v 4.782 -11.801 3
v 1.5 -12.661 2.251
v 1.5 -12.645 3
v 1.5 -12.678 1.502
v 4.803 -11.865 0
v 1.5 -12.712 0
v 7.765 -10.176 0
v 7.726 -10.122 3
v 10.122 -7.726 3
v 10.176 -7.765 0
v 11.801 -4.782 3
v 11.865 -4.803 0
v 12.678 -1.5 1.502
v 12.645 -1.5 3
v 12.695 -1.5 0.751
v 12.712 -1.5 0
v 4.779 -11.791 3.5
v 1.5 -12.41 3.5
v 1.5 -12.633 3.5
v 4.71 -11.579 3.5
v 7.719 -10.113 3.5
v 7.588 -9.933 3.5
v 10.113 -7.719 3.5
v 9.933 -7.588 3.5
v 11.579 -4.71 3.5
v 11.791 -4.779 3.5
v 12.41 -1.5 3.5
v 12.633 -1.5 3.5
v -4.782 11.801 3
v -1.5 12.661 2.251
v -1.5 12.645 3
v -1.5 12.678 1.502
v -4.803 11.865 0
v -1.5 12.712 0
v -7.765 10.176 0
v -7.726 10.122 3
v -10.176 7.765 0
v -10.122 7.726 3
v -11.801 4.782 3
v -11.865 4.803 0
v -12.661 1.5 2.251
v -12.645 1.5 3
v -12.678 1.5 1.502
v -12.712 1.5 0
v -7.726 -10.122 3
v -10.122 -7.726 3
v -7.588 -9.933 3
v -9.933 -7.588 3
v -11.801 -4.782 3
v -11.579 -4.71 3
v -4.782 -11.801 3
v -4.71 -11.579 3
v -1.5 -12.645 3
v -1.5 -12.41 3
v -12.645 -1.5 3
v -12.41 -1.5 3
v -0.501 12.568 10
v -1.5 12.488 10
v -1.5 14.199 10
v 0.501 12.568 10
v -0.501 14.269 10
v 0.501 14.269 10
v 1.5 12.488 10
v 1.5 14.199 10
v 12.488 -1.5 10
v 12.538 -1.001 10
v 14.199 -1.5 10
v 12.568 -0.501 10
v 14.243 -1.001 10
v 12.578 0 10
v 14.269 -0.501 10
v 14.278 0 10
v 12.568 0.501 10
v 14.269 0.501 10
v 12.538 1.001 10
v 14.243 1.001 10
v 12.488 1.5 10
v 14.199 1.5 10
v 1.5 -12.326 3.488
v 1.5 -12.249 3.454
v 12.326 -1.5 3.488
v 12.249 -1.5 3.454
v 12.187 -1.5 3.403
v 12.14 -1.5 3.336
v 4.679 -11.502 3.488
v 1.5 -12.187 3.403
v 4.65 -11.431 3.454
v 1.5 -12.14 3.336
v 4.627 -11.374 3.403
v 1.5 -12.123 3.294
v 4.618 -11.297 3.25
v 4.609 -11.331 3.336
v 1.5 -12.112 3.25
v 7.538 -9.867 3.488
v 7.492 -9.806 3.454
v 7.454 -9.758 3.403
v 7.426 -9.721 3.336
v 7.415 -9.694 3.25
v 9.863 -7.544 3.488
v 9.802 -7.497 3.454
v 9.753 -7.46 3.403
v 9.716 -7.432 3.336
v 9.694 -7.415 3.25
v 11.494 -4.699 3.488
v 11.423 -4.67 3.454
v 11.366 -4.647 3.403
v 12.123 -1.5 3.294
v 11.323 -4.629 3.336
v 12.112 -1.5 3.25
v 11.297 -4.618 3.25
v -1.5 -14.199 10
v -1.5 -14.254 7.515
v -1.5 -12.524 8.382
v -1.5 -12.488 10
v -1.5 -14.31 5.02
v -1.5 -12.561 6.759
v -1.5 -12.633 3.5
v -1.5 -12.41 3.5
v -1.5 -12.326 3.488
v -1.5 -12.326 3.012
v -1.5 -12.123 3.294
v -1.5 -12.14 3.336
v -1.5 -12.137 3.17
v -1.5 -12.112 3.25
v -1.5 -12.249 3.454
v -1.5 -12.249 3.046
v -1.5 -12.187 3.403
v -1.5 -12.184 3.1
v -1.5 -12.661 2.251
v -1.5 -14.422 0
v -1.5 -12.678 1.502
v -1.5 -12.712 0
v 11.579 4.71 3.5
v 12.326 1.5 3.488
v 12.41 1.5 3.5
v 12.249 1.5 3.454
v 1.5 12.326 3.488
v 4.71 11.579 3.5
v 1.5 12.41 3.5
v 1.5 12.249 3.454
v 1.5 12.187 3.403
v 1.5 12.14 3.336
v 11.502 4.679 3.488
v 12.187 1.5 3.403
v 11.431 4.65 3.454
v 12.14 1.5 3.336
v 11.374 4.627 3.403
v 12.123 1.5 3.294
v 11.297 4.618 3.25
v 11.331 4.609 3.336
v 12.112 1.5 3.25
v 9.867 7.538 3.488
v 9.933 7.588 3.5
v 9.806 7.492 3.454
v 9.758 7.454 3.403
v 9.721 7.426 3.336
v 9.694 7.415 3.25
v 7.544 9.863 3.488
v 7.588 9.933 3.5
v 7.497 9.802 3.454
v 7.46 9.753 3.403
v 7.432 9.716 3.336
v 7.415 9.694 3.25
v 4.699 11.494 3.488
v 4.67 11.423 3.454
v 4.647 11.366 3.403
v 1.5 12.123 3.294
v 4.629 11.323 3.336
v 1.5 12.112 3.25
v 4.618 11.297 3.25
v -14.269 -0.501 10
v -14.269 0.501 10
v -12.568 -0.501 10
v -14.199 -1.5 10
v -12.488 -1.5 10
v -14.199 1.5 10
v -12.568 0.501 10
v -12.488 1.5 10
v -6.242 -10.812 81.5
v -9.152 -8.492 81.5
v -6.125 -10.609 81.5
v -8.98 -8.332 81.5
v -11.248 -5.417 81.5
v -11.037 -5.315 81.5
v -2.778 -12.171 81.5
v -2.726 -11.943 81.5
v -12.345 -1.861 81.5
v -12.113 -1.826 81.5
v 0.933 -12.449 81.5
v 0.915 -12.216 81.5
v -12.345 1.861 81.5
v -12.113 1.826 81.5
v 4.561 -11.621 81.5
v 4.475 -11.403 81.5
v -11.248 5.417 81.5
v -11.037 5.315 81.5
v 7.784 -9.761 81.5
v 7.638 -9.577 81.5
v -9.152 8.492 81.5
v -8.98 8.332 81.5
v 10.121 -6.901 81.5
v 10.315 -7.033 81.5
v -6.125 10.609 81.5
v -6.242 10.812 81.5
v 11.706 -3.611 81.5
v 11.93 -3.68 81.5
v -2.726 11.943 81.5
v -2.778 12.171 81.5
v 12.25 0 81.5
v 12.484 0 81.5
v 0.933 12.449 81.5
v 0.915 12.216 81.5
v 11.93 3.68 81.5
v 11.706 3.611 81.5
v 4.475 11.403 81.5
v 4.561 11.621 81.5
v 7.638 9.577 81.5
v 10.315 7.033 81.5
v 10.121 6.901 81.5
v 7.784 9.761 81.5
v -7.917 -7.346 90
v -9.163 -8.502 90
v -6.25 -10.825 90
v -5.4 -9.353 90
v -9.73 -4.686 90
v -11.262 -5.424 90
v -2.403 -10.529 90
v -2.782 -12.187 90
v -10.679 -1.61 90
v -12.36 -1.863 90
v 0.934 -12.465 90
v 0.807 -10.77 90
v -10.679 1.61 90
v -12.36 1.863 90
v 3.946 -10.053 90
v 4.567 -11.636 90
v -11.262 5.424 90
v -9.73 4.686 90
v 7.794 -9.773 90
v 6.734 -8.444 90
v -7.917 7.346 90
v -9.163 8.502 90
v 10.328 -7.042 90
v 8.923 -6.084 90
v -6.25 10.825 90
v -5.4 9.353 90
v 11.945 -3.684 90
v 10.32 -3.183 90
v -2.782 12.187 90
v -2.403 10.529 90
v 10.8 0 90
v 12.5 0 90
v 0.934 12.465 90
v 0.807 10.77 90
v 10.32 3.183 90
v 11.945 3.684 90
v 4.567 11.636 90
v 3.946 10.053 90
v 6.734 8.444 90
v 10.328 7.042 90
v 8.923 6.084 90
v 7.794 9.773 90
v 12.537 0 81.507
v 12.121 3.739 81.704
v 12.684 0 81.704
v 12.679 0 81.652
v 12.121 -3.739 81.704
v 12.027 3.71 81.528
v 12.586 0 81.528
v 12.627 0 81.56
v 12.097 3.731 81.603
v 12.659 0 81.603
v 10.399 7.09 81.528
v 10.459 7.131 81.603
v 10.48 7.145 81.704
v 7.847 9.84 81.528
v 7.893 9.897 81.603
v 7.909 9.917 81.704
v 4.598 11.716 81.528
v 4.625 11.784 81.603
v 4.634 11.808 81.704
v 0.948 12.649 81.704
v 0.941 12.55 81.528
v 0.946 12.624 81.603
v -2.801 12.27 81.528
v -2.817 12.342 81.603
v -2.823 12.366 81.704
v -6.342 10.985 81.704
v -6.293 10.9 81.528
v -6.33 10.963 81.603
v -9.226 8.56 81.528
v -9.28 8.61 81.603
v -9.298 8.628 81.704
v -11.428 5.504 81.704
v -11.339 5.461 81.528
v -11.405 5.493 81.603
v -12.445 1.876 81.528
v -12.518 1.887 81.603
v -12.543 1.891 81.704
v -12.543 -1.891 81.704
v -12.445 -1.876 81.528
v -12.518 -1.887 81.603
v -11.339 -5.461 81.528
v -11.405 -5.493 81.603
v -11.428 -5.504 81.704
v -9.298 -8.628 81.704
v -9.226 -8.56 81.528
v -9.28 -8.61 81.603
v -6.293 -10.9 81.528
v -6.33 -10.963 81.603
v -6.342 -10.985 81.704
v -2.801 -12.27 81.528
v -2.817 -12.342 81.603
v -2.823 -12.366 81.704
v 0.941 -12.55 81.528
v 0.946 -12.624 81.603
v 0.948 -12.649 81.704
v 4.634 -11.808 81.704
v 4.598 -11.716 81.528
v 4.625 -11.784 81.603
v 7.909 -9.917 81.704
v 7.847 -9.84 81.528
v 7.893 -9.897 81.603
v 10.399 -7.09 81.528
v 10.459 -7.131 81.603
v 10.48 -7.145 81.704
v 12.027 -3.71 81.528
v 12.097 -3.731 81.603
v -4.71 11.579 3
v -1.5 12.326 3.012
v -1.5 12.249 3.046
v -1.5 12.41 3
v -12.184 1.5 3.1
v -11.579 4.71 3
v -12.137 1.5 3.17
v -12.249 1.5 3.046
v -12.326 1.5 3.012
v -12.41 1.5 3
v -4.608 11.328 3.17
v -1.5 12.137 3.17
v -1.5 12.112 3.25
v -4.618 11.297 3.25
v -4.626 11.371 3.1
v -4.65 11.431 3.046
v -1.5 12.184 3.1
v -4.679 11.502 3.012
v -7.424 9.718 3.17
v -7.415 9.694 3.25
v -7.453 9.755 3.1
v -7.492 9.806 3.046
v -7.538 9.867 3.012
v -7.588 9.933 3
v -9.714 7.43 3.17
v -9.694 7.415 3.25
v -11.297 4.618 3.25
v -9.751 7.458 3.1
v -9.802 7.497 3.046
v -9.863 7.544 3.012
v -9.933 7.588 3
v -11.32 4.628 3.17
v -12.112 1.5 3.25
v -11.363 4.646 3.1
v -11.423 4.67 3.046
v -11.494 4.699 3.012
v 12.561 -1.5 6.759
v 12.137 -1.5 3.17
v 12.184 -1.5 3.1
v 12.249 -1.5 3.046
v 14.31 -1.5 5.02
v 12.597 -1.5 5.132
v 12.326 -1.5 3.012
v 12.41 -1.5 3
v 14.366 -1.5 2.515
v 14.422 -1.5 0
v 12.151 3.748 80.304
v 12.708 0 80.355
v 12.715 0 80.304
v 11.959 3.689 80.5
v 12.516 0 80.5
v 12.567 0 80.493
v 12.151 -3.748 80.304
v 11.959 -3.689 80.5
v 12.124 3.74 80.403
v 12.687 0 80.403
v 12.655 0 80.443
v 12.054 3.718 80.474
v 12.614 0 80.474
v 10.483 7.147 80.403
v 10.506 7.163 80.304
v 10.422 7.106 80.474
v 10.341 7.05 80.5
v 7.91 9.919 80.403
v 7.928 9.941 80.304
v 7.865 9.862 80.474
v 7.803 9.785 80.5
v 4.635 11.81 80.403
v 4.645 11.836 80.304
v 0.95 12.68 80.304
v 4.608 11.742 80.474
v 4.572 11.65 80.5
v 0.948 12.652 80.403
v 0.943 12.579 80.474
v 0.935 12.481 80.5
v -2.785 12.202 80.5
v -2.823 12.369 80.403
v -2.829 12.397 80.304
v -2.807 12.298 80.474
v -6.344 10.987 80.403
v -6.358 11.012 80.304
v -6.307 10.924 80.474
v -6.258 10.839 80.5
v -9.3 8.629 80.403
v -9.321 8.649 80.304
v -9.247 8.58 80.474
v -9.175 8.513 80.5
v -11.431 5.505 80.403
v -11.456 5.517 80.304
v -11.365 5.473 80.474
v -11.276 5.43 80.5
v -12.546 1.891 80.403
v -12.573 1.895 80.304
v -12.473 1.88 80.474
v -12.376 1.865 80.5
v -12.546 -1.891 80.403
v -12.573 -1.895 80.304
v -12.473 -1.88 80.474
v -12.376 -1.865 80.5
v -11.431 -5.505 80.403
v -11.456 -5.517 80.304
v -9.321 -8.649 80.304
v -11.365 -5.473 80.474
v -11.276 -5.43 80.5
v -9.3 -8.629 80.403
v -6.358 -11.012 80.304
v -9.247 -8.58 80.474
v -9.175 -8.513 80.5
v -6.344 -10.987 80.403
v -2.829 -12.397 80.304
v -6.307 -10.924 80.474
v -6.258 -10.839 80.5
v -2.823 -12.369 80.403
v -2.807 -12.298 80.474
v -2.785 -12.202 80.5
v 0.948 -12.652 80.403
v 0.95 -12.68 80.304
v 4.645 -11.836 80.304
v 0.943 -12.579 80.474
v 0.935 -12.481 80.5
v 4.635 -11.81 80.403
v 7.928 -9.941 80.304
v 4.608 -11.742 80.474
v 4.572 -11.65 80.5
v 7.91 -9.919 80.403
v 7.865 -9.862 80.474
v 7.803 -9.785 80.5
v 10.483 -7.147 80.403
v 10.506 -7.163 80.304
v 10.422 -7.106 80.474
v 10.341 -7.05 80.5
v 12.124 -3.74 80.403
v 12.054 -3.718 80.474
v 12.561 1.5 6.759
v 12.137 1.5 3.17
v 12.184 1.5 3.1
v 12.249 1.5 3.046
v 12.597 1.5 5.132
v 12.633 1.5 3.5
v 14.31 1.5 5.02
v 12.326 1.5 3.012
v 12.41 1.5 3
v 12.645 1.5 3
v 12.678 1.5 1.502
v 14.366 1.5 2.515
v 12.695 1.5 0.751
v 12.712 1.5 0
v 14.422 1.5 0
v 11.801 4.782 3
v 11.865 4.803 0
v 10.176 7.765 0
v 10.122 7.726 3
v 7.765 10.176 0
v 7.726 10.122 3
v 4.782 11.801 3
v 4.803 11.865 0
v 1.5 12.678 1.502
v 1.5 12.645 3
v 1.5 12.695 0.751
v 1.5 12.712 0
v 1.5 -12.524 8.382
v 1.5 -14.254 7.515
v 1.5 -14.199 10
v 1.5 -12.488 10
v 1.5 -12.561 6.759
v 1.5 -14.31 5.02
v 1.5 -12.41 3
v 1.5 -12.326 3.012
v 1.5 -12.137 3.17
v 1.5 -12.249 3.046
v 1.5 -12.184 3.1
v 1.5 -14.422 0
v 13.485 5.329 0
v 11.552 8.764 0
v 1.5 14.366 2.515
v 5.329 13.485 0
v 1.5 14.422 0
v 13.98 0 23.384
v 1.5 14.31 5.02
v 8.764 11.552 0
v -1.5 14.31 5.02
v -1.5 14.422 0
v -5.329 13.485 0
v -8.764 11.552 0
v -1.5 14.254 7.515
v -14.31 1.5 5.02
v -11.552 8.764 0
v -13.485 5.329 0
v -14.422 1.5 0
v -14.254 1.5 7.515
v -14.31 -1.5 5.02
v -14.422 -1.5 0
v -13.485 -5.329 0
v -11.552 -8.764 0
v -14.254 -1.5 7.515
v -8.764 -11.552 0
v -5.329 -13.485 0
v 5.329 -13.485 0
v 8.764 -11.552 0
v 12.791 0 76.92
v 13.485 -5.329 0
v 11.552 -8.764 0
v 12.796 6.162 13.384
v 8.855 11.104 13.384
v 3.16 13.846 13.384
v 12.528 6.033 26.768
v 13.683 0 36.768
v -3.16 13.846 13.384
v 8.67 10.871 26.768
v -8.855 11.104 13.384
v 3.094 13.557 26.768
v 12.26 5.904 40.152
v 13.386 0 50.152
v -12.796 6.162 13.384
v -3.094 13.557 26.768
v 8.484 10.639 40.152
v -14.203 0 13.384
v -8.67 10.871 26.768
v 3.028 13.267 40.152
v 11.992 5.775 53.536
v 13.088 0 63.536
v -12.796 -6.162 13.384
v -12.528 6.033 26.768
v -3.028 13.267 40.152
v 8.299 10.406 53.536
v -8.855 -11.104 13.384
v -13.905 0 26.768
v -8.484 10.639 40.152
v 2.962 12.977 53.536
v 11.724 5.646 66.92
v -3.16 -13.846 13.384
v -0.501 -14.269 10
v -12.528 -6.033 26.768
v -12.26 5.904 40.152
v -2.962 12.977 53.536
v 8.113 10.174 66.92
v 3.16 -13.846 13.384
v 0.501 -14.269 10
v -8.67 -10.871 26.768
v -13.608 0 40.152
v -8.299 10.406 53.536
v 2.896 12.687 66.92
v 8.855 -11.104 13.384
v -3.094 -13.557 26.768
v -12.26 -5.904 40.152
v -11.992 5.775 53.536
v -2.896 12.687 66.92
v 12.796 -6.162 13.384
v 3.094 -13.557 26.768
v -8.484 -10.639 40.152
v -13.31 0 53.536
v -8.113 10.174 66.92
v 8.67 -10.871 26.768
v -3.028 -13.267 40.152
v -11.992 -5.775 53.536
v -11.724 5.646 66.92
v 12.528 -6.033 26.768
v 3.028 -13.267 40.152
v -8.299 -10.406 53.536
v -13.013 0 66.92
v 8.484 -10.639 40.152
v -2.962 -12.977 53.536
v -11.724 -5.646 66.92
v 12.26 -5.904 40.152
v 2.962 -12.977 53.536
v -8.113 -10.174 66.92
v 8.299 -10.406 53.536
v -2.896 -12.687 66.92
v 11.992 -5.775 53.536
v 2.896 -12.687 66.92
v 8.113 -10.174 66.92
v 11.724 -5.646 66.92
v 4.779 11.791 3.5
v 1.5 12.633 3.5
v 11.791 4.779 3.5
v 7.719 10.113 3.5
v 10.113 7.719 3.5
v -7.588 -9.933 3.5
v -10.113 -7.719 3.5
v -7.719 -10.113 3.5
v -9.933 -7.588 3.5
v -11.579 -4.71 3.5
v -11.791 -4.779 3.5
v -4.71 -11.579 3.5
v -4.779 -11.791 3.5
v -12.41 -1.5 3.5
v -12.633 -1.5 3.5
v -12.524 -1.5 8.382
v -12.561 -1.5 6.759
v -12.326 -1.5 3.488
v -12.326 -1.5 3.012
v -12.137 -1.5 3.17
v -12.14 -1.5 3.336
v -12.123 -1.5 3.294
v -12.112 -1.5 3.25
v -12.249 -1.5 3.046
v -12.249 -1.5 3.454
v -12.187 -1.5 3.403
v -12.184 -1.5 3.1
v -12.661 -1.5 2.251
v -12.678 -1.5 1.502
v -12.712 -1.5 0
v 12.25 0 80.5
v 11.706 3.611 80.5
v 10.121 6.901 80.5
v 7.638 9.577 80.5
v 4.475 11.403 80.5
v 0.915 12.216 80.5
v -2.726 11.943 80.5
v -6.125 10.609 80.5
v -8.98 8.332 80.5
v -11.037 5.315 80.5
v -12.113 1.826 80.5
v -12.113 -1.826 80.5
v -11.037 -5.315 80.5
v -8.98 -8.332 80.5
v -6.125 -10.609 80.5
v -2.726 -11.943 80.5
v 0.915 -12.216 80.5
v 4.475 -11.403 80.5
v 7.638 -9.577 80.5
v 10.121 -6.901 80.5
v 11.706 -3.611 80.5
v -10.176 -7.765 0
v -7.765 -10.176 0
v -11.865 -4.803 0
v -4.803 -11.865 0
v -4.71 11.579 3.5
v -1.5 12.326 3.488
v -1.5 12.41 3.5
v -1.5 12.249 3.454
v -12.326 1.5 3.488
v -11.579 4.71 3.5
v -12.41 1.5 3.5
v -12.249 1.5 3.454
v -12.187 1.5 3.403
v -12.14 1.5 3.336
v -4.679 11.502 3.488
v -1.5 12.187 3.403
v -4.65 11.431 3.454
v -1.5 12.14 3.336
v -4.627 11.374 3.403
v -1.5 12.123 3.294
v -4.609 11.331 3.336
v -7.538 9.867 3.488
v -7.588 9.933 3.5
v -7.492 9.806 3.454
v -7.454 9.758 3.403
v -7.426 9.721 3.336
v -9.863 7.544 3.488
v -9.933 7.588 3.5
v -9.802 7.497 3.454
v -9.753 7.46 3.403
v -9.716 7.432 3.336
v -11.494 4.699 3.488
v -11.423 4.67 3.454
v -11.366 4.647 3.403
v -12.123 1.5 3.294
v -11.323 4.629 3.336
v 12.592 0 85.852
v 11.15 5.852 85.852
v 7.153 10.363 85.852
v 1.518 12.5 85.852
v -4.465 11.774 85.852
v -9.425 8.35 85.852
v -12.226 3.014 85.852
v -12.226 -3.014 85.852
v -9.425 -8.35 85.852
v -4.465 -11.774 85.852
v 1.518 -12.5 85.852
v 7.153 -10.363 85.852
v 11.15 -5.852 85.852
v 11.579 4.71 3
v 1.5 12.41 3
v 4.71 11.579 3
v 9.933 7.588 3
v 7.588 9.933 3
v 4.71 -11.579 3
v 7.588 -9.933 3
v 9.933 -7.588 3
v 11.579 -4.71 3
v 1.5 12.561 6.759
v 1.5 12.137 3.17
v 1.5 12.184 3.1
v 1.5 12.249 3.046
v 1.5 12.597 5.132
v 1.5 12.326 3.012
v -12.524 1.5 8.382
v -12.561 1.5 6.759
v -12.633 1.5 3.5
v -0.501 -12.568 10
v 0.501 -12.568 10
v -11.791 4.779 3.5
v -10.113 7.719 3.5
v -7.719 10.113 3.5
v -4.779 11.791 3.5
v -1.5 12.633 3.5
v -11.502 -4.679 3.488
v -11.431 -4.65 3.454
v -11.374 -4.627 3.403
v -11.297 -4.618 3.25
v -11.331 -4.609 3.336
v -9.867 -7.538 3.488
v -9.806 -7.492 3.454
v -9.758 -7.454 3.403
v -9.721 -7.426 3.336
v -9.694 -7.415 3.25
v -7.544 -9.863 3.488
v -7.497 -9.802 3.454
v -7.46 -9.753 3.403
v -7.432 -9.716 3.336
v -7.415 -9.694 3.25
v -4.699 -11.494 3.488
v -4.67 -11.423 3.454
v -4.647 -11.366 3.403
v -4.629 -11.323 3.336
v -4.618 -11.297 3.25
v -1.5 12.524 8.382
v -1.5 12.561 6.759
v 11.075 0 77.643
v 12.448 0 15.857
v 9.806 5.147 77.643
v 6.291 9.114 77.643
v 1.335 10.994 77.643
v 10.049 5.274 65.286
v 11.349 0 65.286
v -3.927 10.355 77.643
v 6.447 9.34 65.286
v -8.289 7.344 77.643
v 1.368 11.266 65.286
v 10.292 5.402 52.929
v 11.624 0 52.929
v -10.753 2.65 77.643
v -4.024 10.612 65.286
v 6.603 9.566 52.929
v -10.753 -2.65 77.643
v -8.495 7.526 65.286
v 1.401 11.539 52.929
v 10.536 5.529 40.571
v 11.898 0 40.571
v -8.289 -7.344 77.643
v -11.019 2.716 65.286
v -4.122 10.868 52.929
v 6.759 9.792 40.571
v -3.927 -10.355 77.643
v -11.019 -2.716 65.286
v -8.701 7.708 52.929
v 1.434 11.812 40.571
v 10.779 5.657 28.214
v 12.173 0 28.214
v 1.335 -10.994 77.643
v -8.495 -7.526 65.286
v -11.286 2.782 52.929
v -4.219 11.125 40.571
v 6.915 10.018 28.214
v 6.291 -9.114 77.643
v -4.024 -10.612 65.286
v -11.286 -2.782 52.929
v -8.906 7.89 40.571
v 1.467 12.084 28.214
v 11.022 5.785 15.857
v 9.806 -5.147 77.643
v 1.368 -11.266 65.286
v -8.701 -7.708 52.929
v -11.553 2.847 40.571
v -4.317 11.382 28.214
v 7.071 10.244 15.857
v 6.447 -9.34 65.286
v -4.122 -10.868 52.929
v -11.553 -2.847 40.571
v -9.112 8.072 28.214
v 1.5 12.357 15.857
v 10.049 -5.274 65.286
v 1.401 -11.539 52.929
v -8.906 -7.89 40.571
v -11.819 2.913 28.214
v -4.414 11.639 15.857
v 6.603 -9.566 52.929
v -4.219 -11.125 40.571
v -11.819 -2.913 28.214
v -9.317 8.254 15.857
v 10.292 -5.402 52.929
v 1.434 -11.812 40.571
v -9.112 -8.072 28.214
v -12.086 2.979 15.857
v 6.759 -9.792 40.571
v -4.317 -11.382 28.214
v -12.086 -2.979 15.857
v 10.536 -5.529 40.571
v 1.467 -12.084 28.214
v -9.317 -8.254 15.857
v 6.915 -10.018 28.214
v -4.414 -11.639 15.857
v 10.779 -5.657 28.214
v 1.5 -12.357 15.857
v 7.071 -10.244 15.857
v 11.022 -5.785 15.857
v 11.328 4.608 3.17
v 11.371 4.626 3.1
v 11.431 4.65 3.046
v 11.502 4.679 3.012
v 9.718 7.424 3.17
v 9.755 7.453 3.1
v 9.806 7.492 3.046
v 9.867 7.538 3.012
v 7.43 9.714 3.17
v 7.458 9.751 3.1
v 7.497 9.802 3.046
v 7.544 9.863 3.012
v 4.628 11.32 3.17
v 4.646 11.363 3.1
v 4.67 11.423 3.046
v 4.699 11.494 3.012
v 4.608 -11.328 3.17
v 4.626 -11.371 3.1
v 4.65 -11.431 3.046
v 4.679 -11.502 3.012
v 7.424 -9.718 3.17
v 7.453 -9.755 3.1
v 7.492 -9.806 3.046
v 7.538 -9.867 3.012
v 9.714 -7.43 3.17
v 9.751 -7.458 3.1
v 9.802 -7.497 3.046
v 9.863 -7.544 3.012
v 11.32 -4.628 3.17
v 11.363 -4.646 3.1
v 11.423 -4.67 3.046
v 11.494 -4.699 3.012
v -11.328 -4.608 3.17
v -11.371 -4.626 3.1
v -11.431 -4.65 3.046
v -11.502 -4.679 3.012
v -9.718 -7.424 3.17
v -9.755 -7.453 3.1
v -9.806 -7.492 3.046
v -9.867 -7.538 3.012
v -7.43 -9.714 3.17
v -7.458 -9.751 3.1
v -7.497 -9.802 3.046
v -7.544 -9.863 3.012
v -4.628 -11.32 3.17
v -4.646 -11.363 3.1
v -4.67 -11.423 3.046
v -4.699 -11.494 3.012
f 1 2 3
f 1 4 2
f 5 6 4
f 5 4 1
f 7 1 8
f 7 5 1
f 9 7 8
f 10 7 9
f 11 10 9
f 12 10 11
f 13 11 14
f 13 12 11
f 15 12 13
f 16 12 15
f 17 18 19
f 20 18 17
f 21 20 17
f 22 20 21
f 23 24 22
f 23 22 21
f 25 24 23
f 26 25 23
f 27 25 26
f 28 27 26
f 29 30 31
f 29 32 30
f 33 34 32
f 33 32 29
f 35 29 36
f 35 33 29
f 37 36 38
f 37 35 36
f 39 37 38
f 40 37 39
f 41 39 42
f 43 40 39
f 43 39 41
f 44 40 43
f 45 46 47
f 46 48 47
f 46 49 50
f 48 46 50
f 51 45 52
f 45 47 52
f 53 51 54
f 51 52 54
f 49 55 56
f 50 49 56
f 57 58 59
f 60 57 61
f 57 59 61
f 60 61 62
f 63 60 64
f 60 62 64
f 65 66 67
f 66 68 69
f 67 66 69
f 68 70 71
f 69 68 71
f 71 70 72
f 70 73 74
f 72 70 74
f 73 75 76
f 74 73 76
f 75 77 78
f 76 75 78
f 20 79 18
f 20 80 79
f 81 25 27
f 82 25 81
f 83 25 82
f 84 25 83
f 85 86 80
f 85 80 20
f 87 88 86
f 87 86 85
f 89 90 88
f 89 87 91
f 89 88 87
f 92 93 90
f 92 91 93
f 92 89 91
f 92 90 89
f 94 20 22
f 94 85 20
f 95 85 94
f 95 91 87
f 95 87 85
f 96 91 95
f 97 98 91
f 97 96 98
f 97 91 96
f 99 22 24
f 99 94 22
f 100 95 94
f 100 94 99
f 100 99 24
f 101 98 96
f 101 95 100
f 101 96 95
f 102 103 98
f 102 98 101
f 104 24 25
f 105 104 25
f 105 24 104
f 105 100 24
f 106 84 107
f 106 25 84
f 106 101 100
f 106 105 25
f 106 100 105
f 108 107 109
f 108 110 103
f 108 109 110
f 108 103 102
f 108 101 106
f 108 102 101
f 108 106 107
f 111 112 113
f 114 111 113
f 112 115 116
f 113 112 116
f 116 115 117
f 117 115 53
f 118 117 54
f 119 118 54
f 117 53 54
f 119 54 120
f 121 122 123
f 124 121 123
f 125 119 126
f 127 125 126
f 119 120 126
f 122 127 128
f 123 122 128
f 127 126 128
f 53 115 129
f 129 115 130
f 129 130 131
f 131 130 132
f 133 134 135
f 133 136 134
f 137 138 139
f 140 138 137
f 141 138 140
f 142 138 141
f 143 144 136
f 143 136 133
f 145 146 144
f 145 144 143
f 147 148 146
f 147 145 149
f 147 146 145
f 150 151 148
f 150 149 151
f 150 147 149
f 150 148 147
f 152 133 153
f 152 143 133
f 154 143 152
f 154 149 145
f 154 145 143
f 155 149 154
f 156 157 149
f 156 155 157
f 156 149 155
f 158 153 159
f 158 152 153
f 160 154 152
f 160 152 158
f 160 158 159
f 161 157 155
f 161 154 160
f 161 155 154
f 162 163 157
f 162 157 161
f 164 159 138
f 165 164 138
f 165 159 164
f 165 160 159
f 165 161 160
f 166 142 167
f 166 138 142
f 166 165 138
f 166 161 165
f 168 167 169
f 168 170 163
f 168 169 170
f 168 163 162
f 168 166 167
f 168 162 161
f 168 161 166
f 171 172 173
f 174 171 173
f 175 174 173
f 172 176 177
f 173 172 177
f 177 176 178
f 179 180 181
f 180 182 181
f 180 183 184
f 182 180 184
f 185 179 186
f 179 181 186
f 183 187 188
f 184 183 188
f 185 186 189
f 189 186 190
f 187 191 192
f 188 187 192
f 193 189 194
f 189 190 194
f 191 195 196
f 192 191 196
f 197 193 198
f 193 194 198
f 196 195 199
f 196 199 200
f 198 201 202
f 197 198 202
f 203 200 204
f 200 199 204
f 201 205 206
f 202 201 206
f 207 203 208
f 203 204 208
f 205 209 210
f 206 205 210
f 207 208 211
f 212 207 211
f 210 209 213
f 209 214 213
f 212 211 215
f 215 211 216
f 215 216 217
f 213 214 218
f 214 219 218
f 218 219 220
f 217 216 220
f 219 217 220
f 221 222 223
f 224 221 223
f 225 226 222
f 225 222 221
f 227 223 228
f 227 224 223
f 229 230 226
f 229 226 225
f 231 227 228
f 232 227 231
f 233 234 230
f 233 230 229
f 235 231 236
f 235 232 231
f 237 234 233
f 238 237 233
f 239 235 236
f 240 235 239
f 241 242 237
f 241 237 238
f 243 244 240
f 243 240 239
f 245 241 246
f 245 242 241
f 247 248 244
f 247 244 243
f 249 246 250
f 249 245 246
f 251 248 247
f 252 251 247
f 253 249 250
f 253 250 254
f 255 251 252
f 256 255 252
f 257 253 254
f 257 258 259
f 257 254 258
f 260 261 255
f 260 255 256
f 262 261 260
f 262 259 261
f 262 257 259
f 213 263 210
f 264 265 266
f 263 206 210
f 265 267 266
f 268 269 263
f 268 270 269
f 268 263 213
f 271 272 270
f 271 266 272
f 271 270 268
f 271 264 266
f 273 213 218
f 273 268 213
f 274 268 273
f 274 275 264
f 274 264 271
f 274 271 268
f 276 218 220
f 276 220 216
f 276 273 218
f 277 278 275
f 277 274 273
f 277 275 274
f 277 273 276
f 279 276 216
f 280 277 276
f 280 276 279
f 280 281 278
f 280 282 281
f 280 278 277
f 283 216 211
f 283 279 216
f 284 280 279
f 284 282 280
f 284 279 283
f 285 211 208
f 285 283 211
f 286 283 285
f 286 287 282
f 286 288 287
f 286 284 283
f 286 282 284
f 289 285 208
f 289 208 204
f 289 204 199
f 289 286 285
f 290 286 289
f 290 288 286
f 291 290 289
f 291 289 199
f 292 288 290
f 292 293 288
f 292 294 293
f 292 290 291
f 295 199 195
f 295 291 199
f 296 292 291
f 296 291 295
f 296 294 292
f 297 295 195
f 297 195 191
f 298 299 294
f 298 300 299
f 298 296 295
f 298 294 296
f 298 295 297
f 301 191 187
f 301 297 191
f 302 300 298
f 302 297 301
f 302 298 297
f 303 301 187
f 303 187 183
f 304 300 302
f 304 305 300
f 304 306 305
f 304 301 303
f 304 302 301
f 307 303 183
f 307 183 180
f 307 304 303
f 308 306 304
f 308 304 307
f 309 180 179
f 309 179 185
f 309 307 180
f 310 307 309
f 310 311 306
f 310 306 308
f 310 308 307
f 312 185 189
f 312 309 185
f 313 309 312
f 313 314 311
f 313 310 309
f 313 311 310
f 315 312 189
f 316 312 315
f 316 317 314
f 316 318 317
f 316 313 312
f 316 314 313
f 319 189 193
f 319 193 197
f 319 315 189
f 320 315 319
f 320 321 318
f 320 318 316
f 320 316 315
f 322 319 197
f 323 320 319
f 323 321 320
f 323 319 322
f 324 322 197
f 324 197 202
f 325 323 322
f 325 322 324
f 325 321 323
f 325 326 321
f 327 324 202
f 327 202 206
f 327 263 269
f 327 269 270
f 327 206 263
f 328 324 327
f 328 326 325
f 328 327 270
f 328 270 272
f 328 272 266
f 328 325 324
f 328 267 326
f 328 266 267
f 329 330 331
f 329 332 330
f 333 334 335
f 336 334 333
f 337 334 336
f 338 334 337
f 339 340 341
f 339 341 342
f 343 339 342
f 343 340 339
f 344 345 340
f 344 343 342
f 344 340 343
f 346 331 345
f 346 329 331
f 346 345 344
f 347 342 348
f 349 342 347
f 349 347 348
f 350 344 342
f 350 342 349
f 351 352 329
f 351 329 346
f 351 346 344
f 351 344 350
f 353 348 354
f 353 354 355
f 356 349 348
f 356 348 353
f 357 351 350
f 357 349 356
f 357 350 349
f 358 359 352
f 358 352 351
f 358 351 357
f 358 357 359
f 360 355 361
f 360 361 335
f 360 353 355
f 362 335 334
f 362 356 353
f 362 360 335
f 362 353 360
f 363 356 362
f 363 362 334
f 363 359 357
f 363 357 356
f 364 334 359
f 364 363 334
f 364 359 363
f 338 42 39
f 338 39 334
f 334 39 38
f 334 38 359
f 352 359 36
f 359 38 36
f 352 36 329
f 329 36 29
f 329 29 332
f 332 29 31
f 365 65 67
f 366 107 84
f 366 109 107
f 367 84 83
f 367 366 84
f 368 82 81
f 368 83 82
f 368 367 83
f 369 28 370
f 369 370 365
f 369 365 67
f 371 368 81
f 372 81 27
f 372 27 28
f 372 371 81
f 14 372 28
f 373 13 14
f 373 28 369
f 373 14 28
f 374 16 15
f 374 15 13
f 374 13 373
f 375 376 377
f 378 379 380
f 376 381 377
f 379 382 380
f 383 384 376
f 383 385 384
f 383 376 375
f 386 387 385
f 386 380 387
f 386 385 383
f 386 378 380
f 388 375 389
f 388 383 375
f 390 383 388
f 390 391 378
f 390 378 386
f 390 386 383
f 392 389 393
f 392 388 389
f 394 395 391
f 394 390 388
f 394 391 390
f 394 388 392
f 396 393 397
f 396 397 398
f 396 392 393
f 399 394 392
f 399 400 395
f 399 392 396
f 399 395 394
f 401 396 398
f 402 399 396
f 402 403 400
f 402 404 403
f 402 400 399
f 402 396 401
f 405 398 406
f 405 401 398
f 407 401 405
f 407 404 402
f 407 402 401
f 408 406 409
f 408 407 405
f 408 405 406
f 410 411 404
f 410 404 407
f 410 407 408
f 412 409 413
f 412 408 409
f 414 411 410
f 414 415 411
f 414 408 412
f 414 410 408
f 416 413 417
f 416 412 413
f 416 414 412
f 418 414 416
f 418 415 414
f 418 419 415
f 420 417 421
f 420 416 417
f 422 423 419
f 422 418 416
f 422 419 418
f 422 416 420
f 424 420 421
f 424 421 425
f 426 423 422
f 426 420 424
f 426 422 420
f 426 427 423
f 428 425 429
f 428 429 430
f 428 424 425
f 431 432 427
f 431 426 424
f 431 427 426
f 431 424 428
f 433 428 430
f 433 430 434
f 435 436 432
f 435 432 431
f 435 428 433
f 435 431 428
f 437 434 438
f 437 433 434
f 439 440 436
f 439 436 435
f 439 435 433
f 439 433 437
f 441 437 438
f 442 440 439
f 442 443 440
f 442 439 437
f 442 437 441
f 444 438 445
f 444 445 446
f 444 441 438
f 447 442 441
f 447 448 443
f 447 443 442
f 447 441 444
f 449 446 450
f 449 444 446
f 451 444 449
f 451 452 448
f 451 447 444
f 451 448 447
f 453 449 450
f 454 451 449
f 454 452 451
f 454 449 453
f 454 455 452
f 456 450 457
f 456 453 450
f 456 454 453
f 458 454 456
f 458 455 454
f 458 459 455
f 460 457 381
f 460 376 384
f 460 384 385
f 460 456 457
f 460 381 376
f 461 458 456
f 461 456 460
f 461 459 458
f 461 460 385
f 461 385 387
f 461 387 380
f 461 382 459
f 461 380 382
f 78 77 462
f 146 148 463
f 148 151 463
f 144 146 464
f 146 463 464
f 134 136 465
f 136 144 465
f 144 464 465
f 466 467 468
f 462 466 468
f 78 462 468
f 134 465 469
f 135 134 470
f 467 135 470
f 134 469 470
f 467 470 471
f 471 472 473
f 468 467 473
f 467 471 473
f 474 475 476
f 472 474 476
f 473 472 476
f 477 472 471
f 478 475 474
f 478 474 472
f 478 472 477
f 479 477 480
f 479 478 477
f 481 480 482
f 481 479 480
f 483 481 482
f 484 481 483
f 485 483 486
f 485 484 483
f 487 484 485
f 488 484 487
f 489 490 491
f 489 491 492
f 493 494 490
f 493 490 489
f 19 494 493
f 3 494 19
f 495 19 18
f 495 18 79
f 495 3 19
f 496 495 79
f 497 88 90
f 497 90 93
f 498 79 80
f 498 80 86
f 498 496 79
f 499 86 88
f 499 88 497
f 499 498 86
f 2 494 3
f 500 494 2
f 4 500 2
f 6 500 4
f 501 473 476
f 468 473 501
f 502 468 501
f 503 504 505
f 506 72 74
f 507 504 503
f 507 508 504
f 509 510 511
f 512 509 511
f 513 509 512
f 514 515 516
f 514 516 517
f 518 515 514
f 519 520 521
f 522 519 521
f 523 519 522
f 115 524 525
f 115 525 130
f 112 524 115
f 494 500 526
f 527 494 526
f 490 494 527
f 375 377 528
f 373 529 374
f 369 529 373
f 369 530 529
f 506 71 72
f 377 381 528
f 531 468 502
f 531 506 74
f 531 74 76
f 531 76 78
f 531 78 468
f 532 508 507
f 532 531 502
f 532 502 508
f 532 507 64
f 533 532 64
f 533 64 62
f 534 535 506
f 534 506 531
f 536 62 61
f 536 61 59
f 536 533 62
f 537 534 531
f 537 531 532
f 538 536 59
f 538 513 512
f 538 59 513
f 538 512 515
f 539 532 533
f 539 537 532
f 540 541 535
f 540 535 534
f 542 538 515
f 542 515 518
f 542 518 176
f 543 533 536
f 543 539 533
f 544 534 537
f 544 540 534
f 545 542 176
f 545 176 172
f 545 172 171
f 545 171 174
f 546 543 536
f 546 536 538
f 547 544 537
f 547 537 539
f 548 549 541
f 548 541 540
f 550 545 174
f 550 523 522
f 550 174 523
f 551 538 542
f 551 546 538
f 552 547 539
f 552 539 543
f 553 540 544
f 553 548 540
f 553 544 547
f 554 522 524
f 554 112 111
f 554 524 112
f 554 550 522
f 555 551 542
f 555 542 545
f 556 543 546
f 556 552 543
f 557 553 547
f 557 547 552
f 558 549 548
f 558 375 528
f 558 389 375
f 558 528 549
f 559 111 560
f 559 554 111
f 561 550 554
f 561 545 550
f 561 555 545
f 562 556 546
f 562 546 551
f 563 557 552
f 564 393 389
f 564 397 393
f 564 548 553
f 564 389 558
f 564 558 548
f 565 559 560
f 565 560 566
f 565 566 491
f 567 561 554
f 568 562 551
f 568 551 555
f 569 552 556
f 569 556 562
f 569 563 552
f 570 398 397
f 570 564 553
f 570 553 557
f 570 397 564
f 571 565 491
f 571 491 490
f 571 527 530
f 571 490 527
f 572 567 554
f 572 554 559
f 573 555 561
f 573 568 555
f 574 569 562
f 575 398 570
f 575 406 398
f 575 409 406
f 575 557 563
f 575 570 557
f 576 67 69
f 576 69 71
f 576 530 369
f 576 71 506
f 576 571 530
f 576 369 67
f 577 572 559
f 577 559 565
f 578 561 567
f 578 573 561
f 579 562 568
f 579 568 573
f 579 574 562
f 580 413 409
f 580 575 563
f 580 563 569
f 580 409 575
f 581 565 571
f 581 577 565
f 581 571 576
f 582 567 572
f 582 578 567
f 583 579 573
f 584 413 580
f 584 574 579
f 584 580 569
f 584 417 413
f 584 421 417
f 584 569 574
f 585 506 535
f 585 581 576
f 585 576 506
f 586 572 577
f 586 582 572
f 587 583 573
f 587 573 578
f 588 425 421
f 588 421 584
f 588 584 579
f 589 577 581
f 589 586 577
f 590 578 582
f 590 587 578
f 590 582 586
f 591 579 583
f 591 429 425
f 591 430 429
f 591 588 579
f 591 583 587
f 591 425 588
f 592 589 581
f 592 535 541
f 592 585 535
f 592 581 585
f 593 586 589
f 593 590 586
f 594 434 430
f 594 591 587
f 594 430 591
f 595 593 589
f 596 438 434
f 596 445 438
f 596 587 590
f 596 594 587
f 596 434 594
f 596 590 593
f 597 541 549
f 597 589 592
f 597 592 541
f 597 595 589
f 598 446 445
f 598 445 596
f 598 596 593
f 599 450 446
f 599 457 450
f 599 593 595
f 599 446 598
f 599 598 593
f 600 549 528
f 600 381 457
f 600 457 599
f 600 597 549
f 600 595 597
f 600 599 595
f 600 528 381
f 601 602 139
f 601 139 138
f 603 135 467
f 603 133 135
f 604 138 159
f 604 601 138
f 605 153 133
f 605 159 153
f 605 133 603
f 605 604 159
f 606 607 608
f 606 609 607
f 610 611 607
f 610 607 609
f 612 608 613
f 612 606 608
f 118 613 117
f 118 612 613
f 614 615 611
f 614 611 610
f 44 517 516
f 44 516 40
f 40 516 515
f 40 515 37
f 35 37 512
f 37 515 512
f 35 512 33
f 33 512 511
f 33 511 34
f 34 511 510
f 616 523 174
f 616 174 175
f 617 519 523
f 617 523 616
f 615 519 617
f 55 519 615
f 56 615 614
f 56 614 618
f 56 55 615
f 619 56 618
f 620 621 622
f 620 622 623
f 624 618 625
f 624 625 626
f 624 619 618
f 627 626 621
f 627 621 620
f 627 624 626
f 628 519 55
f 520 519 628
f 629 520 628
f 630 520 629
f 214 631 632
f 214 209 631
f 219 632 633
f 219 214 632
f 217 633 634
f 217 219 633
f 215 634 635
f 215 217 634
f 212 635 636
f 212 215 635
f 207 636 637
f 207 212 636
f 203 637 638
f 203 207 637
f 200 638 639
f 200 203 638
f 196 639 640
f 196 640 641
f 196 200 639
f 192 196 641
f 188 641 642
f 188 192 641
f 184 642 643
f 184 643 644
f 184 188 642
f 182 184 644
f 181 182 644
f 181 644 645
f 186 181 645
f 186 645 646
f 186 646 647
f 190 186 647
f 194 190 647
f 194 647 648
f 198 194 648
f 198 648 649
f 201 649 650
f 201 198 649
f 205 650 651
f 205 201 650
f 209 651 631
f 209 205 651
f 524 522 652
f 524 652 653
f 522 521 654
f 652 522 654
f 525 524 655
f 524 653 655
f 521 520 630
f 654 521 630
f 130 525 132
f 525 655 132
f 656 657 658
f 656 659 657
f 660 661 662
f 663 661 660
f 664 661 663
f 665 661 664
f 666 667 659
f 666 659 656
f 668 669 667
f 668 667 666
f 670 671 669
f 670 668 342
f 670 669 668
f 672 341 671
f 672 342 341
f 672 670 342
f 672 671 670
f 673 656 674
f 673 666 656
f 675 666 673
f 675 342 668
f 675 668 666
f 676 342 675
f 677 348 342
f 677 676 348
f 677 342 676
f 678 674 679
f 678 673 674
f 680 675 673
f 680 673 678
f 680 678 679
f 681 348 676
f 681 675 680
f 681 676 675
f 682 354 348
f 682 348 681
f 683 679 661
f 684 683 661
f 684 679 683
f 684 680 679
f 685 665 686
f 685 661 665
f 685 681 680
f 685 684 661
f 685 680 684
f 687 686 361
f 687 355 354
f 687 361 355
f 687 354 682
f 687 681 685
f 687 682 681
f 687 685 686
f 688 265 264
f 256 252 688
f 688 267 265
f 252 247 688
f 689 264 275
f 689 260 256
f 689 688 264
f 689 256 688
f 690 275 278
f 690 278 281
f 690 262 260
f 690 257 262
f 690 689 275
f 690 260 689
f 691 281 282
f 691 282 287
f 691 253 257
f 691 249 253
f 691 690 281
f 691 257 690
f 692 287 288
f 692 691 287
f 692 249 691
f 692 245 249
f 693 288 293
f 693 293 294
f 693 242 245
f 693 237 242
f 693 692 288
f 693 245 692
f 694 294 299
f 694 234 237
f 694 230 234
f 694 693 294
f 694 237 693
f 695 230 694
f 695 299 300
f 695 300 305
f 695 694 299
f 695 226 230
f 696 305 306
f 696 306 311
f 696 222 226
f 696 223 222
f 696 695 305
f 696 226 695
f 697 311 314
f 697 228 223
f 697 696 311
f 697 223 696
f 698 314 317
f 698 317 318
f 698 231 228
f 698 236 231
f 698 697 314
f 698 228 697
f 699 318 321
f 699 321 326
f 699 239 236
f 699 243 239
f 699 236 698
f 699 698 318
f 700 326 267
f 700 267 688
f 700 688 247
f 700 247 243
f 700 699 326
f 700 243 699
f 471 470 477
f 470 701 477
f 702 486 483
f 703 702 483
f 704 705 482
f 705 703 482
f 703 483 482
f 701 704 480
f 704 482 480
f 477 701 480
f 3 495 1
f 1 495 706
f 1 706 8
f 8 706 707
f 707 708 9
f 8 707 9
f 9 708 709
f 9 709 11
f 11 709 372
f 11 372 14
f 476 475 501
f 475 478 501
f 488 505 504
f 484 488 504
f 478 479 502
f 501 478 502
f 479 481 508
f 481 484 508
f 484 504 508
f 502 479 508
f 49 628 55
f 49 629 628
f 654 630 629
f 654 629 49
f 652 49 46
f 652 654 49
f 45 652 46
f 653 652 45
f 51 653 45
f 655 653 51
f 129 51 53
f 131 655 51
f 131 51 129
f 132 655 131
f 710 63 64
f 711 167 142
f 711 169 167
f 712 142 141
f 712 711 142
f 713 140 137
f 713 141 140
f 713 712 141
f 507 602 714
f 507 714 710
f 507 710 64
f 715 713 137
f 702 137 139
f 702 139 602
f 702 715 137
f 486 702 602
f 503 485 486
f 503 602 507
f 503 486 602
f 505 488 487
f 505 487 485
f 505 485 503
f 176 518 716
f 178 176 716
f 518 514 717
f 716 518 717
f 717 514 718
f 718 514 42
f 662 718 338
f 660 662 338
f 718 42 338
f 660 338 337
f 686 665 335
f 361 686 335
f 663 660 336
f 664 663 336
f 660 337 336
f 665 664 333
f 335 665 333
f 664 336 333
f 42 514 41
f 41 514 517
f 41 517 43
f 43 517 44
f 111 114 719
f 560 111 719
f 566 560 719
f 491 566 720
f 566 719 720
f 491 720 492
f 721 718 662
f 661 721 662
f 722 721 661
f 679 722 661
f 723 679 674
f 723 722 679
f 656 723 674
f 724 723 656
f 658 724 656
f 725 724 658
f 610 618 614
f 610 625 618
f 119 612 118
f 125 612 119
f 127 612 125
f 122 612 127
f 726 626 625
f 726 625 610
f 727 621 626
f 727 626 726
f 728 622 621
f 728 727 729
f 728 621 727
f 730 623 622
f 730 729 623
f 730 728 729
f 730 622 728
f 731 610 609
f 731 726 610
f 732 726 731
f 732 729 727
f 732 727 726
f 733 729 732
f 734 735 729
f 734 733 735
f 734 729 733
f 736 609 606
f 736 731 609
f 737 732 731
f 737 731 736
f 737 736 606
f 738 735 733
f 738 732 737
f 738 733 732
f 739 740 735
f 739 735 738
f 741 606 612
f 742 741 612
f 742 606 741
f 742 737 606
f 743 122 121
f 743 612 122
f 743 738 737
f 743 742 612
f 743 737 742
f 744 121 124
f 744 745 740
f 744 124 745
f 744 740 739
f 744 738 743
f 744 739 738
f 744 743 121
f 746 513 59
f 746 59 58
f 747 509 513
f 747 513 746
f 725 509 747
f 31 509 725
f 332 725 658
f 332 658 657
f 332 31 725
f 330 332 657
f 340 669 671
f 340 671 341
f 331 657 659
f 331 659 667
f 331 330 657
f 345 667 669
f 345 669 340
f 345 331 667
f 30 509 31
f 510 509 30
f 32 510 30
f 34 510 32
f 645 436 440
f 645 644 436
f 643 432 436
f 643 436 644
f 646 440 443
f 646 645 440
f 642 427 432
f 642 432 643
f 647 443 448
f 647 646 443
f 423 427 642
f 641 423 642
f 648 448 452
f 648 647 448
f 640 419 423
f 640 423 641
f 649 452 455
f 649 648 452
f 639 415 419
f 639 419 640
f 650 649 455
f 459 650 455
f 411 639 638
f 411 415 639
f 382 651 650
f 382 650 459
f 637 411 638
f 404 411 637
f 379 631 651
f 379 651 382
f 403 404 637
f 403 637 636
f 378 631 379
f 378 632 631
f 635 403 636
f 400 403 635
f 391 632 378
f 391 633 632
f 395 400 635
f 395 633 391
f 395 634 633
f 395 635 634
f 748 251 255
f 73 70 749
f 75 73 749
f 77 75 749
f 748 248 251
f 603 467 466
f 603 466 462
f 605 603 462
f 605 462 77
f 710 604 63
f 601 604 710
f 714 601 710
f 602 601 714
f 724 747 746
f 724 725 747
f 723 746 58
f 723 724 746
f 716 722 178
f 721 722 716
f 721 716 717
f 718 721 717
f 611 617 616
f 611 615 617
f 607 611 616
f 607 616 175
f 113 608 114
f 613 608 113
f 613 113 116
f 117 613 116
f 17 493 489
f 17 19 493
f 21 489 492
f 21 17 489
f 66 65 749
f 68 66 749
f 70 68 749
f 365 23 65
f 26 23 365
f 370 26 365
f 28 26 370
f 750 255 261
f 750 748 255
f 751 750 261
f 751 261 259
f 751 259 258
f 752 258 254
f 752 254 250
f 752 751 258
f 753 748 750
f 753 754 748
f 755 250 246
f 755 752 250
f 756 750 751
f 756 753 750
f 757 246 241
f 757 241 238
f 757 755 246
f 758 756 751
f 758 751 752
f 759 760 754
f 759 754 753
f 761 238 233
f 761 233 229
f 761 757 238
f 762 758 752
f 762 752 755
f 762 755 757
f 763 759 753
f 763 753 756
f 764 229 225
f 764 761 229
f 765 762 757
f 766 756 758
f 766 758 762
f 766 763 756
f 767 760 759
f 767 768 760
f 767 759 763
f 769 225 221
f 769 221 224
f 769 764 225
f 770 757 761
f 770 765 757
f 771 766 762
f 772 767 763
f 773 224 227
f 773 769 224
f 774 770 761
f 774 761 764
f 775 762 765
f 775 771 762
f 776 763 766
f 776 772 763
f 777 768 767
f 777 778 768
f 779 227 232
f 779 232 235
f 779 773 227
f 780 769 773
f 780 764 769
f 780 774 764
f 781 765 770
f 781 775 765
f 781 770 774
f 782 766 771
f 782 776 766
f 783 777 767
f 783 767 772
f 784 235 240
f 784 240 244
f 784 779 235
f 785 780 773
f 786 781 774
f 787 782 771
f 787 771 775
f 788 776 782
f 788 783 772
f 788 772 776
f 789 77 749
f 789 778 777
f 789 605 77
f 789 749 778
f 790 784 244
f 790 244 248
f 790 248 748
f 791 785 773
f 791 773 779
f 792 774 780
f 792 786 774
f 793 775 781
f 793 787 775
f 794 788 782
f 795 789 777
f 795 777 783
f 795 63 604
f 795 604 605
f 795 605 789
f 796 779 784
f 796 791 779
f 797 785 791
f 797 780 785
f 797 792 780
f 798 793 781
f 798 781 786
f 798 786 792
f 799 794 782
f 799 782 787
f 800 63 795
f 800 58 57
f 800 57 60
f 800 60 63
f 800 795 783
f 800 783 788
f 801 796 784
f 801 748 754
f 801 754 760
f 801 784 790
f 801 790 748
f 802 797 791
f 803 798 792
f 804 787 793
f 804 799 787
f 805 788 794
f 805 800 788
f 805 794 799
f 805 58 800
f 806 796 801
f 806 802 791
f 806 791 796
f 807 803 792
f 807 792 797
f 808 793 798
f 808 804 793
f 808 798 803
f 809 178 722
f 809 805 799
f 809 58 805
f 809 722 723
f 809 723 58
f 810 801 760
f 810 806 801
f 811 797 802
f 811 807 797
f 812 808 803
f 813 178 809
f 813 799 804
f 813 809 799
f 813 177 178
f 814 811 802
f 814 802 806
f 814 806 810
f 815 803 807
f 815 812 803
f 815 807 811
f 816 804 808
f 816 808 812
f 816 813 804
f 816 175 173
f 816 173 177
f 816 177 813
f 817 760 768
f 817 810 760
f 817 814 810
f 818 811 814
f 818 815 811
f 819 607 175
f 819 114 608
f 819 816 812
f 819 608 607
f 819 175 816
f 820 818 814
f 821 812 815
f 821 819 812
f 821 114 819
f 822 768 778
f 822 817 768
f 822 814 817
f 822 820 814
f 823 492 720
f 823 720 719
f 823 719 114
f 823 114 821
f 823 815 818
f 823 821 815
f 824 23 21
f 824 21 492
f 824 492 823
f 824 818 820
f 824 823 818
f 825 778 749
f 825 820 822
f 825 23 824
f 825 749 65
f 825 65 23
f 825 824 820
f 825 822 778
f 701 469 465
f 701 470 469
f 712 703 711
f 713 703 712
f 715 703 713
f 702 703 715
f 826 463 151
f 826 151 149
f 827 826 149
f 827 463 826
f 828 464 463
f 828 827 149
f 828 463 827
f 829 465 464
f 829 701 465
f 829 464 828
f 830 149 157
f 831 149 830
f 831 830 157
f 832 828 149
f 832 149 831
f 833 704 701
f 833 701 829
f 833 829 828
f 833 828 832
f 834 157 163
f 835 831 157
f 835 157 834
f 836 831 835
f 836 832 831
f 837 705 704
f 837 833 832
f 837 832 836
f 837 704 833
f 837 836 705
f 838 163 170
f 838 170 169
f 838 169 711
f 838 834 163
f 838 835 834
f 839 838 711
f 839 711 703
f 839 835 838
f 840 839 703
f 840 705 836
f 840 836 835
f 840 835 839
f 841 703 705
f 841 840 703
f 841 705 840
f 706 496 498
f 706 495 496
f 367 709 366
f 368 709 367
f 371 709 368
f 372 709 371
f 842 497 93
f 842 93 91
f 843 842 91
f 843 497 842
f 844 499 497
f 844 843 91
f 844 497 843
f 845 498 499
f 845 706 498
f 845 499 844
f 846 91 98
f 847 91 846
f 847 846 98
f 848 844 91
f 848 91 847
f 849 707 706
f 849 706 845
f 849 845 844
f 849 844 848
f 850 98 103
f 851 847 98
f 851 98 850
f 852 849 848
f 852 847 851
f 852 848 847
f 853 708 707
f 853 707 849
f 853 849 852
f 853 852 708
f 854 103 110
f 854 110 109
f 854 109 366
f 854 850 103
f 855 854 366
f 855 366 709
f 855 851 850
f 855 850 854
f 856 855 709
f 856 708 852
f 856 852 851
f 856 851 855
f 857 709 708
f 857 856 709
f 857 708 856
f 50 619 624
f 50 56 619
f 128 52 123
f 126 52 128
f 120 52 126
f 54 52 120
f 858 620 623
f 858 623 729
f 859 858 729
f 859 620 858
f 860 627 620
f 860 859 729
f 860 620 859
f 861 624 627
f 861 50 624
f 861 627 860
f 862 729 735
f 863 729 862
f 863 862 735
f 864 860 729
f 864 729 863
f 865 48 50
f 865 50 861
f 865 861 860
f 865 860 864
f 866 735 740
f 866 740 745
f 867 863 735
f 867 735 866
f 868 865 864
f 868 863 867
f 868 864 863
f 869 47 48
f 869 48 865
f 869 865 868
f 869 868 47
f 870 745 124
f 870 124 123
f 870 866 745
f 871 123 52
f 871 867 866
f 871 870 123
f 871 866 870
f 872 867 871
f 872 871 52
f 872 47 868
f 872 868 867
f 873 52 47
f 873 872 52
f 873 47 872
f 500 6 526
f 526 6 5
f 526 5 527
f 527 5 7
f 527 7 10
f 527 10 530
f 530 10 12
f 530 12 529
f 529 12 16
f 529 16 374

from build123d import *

# Parameters (mm, degrees)
F0_R          = 14.5
F2_R          = 12.5
F5_R          = 10.8
F4_R          = 12.8
F8_R          = 14.5
F8_R_2        = 12.25
F9_DEPTH      = 0.5
F10_DEPTH     = 0.5
F11_R         = 0.2
F13_R         = 14
F13_R_2       = 12.2
F14_DEPTH     = 0.5
F15_DEPTH     = 0.5
F16_W         = 3
F16_H         = 15
F16_H_2       = 3
F16_W_2       = 15
F17_DEPTH     = 10
F18_T2_ANGLE  = 82.921707092
F18_T4_ANGLE  = 82.921707092
F18_T6_ANGLE  = 82.921707092
F18_T8_ANGLE  = 82.921707092
F18_T10_ANGLE = 82.921707092
F18_T12_ANGLE = 82.921707092
F18_T14_ANGLE = 82.921707092
F18_T16_ANGLE = 82.921707092


# Not quite as in the source:
# - a fillet or chamfer that OpenCascade refuses, or shapes differently, is made with other operations: its cross-section is extruded or revolved along the edge and cut away or added
# - a feature of the source that left no trace in its solid (it failed there, or was rolled back) is left out


with BuildPart() as f3:
    # F0 (on Top) → F3 section 0
    with BuildSketch(Plane.XY):
        Circle(F0_R)
    # F2 (on offset) → F3 section 1
    with BuildSketch(Plane.XY.offset(90)):
        Circle(F2_R)
    loft()

    # F5 (on face) → F6 section 0
    with BuildSketch(Plane.XY.offset(90)):
        Circle(F5_R)
    # F4 (on Top) → F6 section 1
    with BuildSketch(Plane.XY):
        Circle(F4_R)
    loft(mode=Mode.SUBTRACT)

    # F8 (on offset) → F9 (cut)
    with BuildSketch(Plane.XY.offset(81)):
        Circle(F8_R)
        Circle(F8_R_2, mode=Mode.SUBTRACT)
    extrude(amount=F9_DEPTH, mode=Mode.SUBTRACT)

    # F8 (on offset) → F10 (cut)
    with BuildSketch(Plane.XY.offset(81)):
        Circle(F8_R)
        Circle(F8_R_2, mode=Mode.SUBTRACT)
    extrude(amount=-F10_DEPTH, mode=Mode.SUBTRACT)

    # F11
    f11_edges = [f3.edges().sort_by_distance(p)[0] for p in [
        (-12.711111, 0, 80.5),
        (-12.688889, 0, 81.5),
    ]]
    fillet(f11_edges, radius=F11_R)

    # F13 (on offset) → F14 (join)
    with BuildSketch(Plane.XY.offset(3)):
        Circle(F13_R)
        Circle(F13_R_2, mode=Mode.SUBTRACT)
    extrude(amount=F14_DEPTH)

    # F13 (on offset) → F15 (join)
    with BuildSketch(Plane.XY.offset(3)):
        Circle(F13_R)
        Circle(F13_R_2, mode=Mode.SUBTRACT)
    extrude(amount=F15_DEPTH)

    # F16 (on face) → F17 (cut)
    with BuildSketch(Plane.XY):
        with Locations((0, 9)):
            Rectangle(F16_W, F16_H)
        Rectangle(F16_W, F16_H_2)
        with Locations((-9, 0)):
            Rectangle(F16_W_2, F16_H_2)
        with Locations((9, 0)):
            Rectangle(F16_W_2, F16_H_2)
        with Locations((0, -9)):
            Rectangle(F16_W, F16_H)
    extrude(amount=F17_DEPTH, mode=Mode.SUBTRACT)

    # F18: fillet of radius 0.3 on 8 edges, made by hand

    # F18_s1 → F18_t2 (revolve, cut)
    with BuildSketch(Plane(origin=(0, 0, 0), x_dir=(0, 0, 1), z_dir=(-0.0617304854, 0.998092855, 0))):
        with BuildLine():
            ThreePointArc((3.3, -12.2), (3.0878679656, -12.2878679656), (3, -12.5))
            Line((3, -12.5), (3, -12.2))
            Line((3, -12.2), (3.3, -12.2))
        make_face()
    revolve(axis=Axis((0, 0, 3), (0, 0, 1)), revolution_arc=F18_T2_ANGLE, mode=Mode.SUBTRACT)

    # F18_s3 → F18_t4 (revolve, cut)
    with BuildSketch(Plane(origin=(0, 0, 0), x_dir=(0, 0, 1), z_dir=(-0.0617304854, 0.998092855, 0))):
        with BuildLine():
            ThreePointArc((3.5, -12.5), (3.4121320344, -12.2878679656), (3.2, -12.2))
            Line((3.2, -12.2), (3.5, -12.2))
            Line((3.5, -12.2), (3.5, -12.5))
        make_face()
    revolve(axis=Axis((0, 0, 3.5), (0, 0, 1)), revolution_arc=F18_T4_ANGLE, mode=Mode.SUBTRACT)

    # F18_s5 → F18_t6 (revolve, cut)
    with BuildSketch(Plane(origin=(0, 0, 0), x_dir=(0, 0, 1), z_dir=(-0.998092855, -0.0617304854, 0))):
        with BuildLine():
            ThreePointArc((3.3, -12.2), (3.0878679656, -12.2878679656), (3, -12.5))
            Line((3, -12.5), (3, -12.2))
            Line((3, -12.2), (3.3, -12.2))
        make_face()
    revolve(axis=Axis((0, 0, 3), (0, 0, 1)), revolution_arc=F18_T6_ANGLE, mode=Mode.SUBTRACT)

    # F18_s7 → F18_t8 (revolve, cut)
    with BuildSketch(Plane(origin=(0, 0, 0), x_dir=(0, 0, 1), z_dir=(-0.998092855, -0.0617304854, 0))):
        with BuildLine():
            ThreePointArc((3.5, -12.5), (3.4121320344, -12.2878679656), (3.2, -12.2))
            Line((3.2, -12.2), (3.5, -12.2))
            Line((3.5, -12.2), (3.5, -12.5))
        make_face()
    revolve(axis=Axis((0, 0, 3.5), (0, 0, 1)), revolution_arc=F18_T8_ANGLE, mode=Mode.SUBTRACT)

    # F18_s9 → F18_t10 (revolve, cut)
    with BuildSketch(Plane(origin=(0, 0, 0), x_dir=(0, 0, 1), z_dir=(0.0617304854, -0.998092855, 0))):
        with BuildLine():
            ThreePointArc((3.3, -12.2), (3.0878679656, -12.2878679656), (3, -12.5))
            Line((3, -12.5), (3, -12.2))
            Line((3, -12.2), (3.3, -12.2))
        make_face()
    revolve(axis=Axis((0, 0, 3), (0, 0, 1)), revolution_arc=F18_T10_ANGLE, mode=Mode.SUBTRACT)

    # F18_s11 → F18_t12 (revolve, cut)
    with BuildSketch(Plane(origin=(0, 0, 0), x_dir=(0, 0, 1), z_dir=(0.0617304854, -0.998092855, 0))):
        with BuildLine():
            ThreePointArc((3.5, -12.5), (3.4121320344, -12.2878679656), (3.2, -12.2))
            Line((3.2, -12.2), (3.5, -12.2))
            Line((3.5, -12.2), (3.5, -12.5))
        make_face()
    revolve(axis=Axis((0, 0, 3.5), (0, 0, 1)), revolution_arc=F18_T12_ANGLE, mode=Mode.SUBTRACT)

    # F18_s13 → F18_t14 (revolve, cut)
    with BuildSketch(Plane(origin=(0, 0, 0), x_dir=(0, 0, 1), z_dir=(0.998092855, 0.0617304854, 0))):
        with BuildLine():
            ThreePointArc((3.3, -12.2), (3.0878679656, -12.2878679656), (3, -12.5))
            Line((3, -12.5), (3, -12.2))
            Line((3, -12.2), (3.3, -12.2))
        make_face()
    revolve(axis=Axis((0, 0, 3), (0, 0, 1)), revolution_arc=F18_T14_ANGLE, mode=Mode.SUBTRACT)

    # F18_s15 → F18_t16 (revolve, cut)
    with BuildSketch(Plane(origin=(0, 0, 0), x_dir=(0, 0, 1), z_dir=(0.998092855, 0.0617304854, 0))):
        with BuildLine():
            ThreePointArc((3.5, -12.5), (3.4121320344, -12.2878679656), (3.2, -12.2))
            Line((3.2, -12.2), (3.5, -12.2))
            Line((3.5, -12.2), (3.5, -12.5))
        make_face()
    revolve(axis=Axis((0, 0, 3.5), (0, 0, 1)), revolution_arc=F18_T16_ANGLE, mode=Mode.SUBTRACT)


solid = f3.part
